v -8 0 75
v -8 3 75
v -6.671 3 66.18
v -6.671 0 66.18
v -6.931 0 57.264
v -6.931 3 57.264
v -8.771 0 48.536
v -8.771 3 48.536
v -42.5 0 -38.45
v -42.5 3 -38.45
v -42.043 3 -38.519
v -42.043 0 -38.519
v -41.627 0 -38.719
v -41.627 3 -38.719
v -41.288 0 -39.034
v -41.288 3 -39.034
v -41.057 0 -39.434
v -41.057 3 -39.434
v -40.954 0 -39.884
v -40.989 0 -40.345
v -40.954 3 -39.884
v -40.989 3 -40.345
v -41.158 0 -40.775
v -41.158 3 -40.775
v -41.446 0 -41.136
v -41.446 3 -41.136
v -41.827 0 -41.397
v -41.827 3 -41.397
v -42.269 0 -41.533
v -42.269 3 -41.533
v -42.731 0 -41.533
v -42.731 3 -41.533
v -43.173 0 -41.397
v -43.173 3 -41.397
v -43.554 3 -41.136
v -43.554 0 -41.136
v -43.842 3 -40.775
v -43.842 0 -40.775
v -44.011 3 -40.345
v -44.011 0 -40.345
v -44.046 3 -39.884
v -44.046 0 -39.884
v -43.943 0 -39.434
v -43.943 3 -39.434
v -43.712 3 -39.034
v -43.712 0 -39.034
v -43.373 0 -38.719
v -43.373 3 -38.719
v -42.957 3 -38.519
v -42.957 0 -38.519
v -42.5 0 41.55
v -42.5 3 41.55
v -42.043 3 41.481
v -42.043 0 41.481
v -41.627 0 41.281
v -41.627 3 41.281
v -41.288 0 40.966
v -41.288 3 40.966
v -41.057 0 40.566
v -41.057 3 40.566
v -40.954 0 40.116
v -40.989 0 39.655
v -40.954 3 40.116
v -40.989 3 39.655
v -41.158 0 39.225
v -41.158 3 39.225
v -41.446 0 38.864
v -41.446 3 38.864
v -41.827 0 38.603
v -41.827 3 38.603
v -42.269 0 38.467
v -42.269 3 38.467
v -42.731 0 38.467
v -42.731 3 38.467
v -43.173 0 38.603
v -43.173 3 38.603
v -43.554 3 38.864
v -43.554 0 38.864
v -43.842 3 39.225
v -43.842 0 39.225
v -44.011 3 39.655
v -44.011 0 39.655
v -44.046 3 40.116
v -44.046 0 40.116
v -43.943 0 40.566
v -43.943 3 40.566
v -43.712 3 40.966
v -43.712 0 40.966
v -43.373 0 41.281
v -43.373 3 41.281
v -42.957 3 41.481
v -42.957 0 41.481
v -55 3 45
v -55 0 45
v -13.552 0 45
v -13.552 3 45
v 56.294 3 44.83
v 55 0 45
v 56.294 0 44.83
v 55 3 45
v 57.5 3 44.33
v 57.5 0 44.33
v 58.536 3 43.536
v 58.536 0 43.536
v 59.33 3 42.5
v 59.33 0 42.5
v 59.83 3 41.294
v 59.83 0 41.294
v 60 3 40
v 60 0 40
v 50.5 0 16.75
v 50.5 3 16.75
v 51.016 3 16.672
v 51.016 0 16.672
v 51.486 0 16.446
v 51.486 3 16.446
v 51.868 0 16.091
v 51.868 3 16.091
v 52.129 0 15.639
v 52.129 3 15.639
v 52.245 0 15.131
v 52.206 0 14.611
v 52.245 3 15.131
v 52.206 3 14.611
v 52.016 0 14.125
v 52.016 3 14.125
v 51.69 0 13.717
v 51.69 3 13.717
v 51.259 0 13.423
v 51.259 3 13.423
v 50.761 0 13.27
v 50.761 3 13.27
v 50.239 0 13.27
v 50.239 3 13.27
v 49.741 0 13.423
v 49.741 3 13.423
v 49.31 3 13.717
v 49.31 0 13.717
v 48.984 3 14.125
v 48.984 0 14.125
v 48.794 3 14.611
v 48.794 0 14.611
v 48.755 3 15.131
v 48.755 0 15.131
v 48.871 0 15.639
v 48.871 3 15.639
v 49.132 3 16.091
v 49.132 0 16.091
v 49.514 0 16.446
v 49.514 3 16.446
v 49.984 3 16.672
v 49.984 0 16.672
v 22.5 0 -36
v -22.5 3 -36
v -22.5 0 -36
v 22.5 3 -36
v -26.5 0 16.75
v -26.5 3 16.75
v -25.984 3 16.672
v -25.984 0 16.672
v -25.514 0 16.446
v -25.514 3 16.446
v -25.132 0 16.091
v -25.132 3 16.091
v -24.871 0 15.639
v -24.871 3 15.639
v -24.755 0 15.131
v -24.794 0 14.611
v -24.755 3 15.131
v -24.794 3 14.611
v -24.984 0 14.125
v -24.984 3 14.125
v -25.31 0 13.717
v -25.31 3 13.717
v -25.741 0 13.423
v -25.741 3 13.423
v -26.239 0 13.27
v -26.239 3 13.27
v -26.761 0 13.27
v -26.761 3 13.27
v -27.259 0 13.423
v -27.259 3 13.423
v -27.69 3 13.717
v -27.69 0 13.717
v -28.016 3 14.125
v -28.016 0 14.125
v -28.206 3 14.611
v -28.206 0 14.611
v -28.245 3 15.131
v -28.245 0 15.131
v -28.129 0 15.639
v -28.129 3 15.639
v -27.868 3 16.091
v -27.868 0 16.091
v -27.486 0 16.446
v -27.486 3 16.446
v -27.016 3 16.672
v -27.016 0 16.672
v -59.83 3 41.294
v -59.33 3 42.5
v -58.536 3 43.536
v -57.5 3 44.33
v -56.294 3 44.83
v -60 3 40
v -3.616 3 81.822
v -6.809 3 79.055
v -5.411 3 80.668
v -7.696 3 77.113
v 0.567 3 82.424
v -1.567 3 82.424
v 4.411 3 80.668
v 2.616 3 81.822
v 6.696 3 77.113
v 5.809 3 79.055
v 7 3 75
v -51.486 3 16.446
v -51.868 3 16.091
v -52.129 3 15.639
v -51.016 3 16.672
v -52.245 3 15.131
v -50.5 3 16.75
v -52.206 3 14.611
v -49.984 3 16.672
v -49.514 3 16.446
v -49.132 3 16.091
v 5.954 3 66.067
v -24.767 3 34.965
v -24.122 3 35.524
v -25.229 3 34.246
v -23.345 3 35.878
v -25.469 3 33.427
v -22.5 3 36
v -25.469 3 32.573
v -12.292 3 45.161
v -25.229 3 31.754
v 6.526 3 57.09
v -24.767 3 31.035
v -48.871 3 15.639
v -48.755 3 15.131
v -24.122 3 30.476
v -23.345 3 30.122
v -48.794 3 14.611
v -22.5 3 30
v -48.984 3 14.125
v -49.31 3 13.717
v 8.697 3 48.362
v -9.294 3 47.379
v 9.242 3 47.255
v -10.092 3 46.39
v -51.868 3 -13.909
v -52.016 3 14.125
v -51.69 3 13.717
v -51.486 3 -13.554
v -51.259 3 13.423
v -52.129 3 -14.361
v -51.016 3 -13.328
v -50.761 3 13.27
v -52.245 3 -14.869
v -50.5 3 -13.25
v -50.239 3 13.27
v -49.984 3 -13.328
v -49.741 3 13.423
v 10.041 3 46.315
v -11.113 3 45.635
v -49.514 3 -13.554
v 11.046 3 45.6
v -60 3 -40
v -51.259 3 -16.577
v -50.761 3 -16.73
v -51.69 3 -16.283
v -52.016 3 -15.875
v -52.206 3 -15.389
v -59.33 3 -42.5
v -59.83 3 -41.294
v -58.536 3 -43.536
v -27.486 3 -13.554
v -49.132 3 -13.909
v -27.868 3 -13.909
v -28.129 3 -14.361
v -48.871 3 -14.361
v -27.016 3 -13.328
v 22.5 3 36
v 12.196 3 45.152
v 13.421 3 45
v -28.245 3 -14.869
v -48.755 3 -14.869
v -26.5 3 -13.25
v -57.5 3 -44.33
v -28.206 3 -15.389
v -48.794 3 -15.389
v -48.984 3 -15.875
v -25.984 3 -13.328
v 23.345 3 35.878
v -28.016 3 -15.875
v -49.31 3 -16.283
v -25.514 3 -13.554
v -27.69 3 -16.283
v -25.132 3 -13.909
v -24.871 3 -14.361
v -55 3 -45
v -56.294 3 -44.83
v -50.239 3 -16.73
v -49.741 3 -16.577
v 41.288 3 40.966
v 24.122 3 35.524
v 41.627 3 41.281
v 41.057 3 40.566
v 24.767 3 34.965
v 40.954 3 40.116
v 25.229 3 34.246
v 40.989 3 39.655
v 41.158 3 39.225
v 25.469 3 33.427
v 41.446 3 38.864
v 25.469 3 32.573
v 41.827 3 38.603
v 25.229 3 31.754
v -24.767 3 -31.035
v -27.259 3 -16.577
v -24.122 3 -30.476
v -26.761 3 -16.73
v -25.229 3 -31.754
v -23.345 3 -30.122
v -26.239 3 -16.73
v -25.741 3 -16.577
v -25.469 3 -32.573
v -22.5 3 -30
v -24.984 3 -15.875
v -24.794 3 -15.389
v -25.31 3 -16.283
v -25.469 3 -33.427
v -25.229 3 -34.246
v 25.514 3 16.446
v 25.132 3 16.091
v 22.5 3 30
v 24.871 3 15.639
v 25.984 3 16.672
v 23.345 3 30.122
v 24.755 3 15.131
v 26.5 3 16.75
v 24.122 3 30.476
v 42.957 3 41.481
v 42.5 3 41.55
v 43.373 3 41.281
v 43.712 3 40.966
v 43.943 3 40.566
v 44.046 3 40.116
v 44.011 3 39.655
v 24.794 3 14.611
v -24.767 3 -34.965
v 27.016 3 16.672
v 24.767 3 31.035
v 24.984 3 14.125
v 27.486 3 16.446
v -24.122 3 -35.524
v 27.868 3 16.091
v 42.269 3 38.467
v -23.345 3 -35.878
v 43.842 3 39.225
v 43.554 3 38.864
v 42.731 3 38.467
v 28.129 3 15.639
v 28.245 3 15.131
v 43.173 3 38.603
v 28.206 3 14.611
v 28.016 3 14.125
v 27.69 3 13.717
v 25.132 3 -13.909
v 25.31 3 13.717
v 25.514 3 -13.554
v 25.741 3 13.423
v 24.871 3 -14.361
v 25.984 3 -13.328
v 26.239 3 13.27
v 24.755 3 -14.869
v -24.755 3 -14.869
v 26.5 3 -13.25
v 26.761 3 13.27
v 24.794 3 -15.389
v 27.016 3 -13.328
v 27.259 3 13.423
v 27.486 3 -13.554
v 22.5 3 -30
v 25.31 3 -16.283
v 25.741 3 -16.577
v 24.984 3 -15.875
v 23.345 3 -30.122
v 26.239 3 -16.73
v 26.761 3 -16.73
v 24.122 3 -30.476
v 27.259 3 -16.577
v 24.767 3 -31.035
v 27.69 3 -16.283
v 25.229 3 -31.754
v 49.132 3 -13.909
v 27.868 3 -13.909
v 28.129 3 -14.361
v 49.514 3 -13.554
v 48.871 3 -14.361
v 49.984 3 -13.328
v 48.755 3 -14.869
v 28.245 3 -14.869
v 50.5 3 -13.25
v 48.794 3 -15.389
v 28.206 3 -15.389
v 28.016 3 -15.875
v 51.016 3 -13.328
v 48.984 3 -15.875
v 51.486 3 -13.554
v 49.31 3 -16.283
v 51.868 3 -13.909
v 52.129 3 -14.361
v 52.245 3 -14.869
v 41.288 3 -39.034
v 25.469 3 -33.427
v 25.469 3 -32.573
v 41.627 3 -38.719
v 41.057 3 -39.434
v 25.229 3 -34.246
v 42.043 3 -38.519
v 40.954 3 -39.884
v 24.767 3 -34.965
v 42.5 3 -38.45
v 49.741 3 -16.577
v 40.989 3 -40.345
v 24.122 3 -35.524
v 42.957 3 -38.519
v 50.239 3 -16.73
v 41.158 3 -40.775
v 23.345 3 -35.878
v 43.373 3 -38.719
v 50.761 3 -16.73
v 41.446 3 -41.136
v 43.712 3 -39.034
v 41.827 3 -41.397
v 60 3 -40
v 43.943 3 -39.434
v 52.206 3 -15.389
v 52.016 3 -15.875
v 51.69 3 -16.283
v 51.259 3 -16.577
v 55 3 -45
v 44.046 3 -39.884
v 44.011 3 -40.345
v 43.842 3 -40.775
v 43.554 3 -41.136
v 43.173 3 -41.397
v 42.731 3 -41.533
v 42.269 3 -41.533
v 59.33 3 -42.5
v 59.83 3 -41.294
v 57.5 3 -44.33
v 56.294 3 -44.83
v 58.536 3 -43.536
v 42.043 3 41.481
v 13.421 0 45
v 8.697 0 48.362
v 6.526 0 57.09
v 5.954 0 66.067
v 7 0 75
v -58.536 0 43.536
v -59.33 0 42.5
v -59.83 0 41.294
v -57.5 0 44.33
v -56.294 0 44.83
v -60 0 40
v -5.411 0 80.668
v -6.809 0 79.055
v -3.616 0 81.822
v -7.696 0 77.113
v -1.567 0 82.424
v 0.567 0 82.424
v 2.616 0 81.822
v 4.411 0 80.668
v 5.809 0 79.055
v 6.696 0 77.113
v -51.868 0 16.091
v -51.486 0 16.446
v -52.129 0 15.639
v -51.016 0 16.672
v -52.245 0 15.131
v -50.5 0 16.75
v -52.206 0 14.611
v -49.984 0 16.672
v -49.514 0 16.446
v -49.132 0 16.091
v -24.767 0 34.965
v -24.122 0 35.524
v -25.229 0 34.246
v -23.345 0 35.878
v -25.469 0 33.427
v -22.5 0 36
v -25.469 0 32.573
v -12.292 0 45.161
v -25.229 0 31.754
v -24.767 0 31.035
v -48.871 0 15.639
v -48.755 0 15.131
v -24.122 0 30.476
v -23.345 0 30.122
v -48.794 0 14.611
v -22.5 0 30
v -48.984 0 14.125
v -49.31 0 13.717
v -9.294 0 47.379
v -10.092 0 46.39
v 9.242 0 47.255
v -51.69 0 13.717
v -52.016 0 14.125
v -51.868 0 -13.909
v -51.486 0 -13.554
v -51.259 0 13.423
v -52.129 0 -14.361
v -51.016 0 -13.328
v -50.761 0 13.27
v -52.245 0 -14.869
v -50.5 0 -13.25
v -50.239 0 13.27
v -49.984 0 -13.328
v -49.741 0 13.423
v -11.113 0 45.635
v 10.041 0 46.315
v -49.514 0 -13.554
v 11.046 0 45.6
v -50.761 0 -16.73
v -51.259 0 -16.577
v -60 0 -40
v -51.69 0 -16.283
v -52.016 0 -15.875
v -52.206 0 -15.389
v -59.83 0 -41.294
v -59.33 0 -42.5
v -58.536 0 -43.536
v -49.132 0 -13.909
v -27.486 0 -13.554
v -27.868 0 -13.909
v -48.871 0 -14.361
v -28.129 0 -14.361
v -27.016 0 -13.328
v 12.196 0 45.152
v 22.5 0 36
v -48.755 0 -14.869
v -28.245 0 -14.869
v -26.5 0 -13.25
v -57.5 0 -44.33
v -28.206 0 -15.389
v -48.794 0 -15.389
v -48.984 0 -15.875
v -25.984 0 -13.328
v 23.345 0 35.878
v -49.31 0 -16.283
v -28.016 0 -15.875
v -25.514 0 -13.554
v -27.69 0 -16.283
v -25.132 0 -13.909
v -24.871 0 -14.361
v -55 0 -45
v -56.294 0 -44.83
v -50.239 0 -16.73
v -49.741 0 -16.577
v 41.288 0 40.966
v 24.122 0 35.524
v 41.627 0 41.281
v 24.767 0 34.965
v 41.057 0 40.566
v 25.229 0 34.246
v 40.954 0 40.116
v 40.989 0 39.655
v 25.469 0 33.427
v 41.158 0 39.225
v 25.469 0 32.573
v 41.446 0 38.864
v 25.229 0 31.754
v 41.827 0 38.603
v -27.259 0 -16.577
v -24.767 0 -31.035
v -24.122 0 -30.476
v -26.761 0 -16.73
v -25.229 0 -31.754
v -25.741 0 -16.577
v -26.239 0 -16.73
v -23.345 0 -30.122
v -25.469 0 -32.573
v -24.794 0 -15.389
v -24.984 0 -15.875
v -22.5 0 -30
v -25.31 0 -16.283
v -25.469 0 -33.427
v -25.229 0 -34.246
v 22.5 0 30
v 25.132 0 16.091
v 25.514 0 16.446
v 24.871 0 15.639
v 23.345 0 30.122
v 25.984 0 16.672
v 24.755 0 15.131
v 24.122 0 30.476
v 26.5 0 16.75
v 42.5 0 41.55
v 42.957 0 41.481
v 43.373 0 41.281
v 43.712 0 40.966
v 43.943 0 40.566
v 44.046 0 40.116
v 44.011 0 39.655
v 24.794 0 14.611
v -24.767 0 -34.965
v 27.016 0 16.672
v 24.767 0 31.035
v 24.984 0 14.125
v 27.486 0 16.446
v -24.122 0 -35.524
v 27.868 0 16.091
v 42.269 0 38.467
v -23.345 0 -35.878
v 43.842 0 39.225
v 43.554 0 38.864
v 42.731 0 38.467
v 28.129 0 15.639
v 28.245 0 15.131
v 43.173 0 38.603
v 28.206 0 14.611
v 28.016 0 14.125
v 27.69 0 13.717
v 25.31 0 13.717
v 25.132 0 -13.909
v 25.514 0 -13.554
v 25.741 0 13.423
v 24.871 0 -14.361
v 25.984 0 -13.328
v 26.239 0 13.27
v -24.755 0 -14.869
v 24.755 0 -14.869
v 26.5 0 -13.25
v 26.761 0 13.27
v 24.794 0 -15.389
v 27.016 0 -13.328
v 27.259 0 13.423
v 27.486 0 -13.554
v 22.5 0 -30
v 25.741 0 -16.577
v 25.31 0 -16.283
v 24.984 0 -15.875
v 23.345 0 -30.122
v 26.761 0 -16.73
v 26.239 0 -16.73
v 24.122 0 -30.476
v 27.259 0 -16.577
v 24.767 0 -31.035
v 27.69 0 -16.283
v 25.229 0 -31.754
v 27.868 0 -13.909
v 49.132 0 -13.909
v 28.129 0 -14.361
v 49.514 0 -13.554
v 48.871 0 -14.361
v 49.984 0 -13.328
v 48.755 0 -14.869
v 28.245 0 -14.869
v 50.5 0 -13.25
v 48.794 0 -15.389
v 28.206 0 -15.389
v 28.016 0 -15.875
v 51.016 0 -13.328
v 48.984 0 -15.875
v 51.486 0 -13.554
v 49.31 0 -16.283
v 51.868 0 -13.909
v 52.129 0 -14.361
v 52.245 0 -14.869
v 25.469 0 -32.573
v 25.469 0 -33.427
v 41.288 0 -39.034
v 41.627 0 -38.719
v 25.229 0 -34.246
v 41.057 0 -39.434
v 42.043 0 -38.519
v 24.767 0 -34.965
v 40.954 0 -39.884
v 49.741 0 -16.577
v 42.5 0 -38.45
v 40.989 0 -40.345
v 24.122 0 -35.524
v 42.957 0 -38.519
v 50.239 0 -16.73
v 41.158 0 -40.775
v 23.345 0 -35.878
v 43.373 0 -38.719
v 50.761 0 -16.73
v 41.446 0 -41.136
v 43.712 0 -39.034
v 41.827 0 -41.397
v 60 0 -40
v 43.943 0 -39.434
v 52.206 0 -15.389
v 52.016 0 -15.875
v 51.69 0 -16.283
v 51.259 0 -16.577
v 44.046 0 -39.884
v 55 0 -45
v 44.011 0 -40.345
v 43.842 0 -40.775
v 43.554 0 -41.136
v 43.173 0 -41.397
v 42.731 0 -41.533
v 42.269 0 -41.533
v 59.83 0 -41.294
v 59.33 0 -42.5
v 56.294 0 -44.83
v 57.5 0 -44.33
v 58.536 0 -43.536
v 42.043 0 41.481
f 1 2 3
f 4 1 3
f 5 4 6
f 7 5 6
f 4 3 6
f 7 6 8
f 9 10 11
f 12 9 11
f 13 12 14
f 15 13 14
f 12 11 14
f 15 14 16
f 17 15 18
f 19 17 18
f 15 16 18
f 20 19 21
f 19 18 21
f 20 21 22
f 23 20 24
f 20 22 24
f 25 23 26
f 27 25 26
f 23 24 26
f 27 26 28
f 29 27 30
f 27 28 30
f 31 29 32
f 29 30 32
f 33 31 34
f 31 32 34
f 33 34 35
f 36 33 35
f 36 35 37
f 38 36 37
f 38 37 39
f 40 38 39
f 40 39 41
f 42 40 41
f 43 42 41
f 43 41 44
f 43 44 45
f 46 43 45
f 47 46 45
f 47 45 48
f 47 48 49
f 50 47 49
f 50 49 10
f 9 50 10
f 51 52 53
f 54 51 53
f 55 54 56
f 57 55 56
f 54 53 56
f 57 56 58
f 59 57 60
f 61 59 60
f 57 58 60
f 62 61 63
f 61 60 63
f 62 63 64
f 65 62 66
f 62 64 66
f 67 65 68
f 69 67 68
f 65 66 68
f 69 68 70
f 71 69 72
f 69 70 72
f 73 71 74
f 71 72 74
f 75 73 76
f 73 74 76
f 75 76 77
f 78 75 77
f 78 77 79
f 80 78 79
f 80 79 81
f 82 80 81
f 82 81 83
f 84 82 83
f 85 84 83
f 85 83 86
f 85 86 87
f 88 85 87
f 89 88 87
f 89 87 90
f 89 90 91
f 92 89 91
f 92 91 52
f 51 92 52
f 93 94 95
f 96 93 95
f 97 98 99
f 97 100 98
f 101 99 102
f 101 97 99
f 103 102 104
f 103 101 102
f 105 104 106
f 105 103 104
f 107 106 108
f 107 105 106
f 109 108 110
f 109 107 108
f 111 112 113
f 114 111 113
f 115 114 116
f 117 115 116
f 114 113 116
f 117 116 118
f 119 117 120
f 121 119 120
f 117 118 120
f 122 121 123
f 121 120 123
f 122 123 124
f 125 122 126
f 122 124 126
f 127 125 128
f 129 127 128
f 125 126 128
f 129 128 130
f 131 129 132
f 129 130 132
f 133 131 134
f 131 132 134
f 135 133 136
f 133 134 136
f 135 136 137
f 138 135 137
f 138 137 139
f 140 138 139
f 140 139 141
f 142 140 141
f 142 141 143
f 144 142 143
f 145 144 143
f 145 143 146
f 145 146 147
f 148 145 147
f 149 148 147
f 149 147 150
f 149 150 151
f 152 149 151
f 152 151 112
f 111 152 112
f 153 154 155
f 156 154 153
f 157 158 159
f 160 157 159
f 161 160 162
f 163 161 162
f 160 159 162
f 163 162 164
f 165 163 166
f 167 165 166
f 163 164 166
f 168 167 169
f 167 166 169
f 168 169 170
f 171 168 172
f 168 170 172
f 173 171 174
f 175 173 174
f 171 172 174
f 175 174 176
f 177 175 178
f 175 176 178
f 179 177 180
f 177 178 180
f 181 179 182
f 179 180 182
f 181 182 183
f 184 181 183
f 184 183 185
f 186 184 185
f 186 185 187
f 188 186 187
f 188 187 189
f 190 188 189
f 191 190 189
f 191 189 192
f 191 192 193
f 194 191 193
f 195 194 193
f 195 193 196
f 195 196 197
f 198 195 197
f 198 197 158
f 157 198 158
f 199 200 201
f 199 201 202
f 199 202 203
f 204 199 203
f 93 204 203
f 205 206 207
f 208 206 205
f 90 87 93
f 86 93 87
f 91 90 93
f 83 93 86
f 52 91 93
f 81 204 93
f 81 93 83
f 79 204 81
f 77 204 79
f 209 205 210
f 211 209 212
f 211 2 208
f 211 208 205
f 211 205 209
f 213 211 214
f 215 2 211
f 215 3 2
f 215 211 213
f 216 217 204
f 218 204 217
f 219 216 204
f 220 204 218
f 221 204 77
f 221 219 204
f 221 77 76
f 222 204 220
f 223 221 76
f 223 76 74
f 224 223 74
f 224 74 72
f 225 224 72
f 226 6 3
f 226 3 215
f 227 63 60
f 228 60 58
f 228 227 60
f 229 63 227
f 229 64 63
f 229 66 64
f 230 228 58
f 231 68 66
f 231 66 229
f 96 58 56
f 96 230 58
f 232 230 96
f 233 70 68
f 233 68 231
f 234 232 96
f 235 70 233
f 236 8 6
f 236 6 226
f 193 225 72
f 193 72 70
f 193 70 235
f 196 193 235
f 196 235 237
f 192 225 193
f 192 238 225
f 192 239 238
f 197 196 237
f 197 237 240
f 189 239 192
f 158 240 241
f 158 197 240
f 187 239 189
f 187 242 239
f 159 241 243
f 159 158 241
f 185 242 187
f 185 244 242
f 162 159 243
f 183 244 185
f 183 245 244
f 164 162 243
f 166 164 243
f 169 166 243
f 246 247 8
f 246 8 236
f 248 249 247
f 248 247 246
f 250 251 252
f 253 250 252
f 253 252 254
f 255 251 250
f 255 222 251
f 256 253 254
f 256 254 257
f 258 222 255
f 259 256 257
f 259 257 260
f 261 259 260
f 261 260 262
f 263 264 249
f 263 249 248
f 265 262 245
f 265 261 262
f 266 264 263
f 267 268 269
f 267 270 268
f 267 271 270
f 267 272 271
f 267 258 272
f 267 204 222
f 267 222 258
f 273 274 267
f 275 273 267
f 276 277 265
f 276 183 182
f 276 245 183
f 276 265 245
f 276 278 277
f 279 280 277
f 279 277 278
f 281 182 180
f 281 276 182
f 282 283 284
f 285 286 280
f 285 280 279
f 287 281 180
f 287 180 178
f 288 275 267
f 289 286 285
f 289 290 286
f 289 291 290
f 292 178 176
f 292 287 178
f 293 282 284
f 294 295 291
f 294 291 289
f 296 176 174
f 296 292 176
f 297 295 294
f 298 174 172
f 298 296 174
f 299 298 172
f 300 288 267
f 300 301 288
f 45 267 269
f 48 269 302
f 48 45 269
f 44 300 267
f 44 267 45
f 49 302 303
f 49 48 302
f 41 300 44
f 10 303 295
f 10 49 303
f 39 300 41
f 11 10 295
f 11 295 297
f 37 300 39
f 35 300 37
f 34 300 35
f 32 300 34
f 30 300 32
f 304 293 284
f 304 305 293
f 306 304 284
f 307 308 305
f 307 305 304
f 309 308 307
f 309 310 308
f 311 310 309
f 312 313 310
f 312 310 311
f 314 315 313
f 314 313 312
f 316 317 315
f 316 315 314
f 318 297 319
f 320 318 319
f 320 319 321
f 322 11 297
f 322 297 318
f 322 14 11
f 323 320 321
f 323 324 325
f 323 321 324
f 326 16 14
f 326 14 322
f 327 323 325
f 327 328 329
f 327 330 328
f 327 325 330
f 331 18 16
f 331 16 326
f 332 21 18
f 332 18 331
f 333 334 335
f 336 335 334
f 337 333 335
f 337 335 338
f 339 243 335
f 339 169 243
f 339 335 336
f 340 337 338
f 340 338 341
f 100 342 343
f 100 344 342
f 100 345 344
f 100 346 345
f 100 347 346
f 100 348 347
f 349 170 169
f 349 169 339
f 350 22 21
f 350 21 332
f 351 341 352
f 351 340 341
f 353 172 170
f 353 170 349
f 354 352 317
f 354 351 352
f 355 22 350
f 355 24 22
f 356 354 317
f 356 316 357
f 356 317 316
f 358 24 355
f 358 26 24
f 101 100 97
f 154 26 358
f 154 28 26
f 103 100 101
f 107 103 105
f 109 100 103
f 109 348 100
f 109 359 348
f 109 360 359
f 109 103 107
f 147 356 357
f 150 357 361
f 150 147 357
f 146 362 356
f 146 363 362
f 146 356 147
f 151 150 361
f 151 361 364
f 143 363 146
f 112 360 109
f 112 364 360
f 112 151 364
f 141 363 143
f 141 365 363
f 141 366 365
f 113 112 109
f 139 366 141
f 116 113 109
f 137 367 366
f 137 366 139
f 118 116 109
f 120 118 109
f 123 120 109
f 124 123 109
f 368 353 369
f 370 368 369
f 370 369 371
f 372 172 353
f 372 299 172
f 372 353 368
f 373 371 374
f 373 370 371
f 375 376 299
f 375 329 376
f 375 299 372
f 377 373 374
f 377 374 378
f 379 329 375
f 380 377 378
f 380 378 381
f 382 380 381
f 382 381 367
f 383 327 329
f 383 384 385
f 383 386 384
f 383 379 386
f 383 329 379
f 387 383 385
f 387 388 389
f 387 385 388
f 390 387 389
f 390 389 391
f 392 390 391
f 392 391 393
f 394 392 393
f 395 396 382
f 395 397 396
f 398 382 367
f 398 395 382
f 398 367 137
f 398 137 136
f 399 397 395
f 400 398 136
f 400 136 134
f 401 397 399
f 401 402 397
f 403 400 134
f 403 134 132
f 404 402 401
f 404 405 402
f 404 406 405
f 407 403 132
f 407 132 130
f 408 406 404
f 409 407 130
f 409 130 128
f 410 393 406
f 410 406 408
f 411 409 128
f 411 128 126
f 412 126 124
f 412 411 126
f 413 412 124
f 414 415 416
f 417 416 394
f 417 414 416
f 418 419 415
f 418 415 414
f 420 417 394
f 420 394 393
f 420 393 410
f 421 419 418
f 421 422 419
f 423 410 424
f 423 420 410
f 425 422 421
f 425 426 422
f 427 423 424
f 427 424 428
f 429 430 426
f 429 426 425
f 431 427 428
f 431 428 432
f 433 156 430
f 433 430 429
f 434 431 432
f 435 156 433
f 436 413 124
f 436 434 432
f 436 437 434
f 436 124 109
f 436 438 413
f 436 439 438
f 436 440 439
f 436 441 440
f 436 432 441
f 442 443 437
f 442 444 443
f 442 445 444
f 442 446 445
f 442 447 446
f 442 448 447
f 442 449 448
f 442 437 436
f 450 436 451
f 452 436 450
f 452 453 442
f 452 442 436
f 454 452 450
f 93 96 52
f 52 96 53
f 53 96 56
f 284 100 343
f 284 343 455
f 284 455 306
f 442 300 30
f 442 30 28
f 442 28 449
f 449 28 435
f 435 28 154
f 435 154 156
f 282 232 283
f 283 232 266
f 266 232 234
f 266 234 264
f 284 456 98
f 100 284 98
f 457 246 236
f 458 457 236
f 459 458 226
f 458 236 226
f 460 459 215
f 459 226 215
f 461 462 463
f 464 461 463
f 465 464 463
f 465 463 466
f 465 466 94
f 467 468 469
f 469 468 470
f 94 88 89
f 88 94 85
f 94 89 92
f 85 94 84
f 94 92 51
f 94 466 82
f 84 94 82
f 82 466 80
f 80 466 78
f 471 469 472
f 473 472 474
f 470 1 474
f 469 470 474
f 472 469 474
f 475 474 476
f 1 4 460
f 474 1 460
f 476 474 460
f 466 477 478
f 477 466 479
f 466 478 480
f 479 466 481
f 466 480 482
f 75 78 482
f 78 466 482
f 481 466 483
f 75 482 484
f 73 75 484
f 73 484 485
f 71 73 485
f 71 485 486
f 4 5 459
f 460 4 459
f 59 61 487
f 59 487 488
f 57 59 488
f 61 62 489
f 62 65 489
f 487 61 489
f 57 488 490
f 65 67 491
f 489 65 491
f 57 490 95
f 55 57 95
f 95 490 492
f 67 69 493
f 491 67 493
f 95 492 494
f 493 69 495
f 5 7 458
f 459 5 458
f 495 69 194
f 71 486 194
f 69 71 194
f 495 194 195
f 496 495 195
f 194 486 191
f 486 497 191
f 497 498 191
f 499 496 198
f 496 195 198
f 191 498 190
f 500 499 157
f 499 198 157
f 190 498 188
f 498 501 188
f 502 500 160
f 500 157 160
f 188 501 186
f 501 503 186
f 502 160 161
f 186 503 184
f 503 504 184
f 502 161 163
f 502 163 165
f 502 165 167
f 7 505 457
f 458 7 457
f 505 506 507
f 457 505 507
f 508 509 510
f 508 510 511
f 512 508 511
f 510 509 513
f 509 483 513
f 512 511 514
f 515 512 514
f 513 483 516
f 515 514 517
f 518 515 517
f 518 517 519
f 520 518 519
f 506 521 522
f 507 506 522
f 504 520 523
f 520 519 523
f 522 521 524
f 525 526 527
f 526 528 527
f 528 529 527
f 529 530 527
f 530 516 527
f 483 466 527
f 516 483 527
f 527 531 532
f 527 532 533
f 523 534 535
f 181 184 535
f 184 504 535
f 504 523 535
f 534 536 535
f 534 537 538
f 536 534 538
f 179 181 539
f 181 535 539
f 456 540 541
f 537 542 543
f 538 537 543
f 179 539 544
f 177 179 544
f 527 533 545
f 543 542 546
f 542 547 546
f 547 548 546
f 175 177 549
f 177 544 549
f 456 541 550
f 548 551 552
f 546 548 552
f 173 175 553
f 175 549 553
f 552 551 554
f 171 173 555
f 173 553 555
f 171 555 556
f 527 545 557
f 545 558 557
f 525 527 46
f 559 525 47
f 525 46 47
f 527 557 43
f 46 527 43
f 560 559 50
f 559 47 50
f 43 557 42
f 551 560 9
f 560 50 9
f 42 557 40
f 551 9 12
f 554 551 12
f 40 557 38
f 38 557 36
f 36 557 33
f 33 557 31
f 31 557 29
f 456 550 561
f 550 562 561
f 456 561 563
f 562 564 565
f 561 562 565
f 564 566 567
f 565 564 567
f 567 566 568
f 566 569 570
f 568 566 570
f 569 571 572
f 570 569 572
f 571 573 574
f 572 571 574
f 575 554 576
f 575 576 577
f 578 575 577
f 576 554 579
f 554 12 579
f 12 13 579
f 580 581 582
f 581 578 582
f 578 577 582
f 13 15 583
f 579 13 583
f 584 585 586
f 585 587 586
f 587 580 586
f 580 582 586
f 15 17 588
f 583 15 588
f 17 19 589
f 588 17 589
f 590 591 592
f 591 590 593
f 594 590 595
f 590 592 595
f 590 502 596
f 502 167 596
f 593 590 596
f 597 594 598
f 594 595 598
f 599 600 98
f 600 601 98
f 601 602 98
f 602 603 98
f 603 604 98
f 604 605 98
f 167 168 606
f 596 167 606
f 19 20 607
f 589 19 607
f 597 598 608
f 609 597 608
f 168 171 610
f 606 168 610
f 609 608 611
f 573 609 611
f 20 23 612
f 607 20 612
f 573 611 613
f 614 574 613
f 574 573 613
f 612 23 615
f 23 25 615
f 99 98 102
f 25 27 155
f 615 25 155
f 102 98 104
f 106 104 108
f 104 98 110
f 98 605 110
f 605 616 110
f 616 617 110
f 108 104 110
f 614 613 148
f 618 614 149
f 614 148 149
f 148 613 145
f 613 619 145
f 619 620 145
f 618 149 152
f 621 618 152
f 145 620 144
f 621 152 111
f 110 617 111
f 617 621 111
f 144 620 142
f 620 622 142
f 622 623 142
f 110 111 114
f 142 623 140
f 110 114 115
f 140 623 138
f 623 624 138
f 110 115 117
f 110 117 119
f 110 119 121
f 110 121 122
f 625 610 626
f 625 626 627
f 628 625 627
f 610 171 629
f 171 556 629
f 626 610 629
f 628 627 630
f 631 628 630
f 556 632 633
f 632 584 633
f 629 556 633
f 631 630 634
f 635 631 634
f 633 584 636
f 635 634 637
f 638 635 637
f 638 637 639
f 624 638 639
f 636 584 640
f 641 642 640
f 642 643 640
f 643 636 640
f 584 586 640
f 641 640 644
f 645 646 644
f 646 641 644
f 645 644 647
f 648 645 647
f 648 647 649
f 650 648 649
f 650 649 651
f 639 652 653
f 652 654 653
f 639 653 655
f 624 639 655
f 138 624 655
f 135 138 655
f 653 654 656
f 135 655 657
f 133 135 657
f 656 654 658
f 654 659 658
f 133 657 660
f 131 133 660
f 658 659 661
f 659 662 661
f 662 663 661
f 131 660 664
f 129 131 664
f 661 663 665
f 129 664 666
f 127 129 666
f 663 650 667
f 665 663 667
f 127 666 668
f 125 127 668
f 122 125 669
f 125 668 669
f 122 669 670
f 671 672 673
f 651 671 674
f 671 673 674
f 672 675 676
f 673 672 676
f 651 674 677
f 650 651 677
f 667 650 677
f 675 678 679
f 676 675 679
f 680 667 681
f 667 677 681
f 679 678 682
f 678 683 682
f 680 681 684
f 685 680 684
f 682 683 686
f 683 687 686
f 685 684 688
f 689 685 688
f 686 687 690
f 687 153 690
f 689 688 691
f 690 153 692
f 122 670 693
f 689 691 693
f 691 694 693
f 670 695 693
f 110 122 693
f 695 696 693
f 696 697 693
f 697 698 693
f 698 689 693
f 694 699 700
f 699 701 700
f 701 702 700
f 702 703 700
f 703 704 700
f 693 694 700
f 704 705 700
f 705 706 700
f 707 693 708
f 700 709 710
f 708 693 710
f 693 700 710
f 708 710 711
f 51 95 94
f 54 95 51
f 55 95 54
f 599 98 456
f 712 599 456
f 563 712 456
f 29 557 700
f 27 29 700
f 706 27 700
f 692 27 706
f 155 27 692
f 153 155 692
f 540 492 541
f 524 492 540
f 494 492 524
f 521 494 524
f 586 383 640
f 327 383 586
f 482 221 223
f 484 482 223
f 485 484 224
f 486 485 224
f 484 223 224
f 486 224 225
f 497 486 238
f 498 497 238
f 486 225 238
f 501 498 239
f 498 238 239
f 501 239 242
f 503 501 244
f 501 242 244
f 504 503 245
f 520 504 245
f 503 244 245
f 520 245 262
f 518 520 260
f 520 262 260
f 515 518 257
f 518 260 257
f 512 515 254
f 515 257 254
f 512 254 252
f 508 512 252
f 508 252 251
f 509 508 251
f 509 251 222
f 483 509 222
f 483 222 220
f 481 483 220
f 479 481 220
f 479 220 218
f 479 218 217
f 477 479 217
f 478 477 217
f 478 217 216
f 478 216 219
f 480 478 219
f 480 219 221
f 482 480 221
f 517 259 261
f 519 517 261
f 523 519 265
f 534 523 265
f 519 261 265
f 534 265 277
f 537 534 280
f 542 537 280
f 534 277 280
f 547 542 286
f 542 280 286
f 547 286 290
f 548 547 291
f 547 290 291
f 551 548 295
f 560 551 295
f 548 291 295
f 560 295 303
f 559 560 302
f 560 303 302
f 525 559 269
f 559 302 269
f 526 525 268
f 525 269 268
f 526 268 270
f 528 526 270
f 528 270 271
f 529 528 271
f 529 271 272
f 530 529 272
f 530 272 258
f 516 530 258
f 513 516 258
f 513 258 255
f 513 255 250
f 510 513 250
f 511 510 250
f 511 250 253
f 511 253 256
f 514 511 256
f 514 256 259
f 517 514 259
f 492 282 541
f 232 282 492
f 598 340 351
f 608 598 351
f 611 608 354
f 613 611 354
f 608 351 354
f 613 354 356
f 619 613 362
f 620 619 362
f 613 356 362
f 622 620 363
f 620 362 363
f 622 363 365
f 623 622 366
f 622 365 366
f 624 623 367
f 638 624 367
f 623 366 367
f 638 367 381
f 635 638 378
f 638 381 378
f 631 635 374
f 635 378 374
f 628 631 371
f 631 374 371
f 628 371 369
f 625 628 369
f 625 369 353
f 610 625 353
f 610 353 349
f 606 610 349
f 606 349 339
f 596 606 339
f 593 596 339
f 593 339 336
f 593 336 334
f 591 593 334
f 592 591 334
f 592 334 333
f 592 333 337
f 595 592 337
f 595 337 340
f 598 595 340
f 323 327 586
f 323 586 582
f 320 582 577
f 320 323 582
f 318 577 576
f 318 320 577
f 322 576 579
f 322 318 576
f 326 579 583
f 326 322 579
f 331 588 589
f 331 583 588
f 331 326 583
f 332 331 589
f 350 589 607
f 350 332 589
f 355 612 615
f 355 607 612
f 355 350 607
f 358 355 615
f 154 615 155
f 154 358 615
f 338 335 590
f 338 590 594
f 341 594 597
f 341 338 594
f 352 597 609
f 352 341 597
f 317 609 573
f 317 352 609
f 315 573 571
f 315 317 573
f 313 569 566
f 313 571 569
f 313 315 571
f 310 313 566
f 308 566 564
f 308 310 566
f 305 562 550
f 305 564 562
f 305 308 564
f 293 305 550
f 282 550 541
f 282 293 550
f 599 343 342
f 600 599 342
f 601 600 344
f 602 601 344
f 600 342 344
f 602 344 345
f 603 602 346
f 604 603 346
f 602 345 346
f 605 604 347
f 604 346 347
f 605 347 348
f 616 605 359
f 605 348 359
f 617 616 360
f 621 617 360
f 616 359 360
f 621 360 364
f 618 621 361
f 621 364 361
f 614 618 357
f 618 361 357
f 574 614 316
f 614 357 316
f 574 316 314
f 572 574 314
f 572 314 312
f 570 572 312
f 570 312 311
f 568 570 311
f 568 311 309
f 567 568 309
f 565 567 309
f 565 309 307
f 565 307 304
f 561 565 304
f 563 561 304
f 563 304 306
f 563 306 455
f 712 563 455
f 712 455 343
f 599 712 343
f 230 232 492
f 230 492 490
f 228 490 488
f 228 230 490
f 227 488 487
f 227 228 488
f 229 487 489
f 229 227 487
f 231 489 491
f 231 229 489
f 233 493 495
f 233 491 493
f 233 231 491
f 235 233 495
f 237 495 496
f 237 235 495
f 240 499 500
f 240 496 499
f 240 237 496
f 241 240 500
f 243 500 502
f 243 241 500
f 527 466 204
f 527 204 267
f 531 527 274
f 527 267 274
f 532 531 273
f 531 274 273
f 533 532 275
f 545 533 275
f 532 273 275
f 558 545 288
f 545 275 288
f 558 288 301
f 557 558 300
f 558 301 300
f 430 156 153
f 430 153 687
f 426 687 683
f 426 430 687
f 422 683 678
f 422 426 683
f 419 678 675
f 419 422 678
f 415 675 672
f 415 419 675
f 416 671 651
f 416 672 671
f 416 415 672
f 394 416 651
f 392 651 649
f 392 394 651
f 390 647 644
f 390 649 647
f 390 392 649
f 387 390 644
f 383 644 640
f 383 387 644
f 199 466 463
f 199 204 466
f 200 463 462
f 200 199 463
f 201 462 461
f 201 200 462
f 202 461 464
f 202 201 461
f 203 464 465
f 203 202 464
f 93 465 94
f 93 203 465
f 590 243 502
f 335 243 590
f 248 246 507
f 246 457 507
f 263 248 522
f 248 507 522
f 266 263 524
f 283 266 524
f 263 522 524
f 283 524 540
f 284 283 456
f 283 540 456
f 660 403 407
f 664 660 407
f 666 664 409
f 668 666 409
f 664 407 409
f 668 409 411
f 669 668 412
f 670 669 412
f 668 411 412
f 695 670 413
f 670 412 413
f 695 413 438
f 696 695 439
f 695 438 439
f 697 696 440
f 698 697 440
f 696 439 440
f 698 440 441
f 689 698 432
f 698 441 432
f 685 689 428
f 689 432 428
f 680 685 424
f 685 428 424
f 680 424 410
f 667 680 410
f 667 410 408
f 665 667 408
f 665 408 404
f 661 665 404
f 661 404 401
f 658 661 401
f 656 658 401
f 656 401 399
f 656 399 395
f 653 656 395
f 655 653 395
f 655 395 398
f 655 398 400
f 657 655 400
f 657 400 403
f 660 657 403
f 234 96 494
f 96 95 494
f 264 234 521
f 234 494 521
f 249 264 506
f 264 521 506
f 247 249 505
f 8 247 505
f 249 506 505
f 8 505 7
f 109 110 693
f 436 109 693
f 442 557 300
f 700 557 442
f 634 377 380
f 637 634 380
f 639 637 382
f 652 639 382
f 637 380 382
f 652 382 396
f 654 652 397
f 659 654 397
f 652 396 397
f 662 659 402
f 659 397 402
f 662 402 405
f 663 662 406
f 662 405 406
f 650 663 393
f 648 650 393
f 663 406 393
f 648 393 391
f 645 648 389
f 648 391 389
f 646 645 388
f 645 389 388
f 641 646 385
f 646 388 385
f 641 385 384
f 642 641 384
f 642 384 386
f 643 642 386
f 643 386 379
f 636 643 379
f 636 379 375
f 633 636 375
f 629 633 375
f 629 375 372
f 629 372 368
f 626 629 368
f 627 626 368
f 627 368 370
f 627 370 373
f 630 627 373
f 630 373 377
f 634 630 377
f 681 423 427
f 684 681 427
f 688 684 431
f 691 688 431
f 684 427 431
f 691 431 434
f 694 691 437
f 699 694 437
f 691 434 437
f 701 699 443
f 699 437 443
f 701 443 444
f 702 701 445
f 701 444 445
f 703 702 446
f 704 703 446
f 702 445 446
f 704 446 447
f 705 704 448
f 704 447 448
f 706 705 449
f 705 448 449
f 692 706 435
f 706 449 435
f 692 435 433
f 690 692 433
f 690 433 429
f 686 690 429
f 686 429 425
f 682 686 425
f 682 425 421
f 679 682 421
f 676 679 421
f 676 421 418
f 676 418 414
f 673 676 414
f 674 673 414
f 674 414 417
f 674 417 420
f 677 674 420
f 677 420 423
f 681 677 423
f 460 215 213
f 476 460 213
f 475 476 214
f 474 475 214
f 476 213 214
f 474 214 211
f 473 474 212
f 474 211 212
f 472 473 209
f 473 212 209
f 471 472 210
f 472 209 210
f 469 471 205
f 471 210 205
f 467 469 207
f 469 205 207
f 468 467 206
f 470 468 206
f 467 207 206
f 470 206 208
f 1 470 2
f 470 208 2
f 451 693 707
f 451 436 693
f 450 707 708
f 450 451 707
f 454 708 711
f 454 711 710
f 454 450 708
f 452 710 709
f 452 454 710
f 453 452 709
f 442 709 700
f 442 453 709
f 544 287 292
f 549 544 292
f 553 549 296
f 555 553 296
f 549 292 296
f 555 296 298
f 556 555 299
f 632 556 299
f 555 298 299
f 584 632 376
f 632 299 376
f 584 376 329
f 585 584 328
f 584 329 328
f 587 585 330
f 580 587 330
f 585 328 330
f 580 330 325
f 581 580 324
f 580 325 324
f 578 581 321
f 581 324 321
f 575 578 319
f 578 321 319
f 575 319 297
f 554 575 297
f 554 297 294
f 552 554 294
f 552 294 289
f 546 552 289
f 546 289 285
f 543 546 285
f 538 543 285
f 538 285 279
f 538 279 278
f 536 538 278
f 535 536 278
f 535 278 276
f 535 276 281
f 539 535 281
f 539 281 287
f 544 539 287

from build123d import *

# Parameters (mm, degrees)
SKETCH1_W           = 120
SKETCH1_H           = 90
BOSS_EXTRUDE1_DEPTH = 3
FILLET_1_R          = 5
CUT_EXTRUDE_1_DEPTH = 76.059976019
EXTRUDE_1_DEPTH     = 3
SKETCH_3_R          = 1.55
SKETCH_3_R_2        = 1.75
CUT_EXTRUDE_2_DEPTH = 103.055132159
FILLET_2_R          = 5


with BuildPart() as part:
    # Sketch1 → Boss-Extrude1 (new body)
    with BuildSketch(Plane(origin=(0, 0, 0), x_dir=(1, 0, 0), z_dir=(0, 1, 0))):
        Rectangle(SKETCH1_W, SKETCH1_H)
    extrude(amount=BOSS_EXTRUDE1_DEPTH)

    # 圆角1
    fillet_1_edges = [part.edges().sort_by_distance(p)[0] for p in [
        (60, 1.5, 45),
        (-60, 1.5, 45),
        (-60, 1.5, -45),
        (60, 1.5, -45),
    ]]
    fillet(fillet_1_edges, radius=FILLET_1_R)

    # 草图1 → 切除-拉伸1 (cut, through all)
    with BuildSketch(Plane(origin=(0, 3, 0), x_dir=(1, 0, 0), z_dir=(0, 1, 0))):
        with BuildLine():
            Line((-22.5, 36), (22.5, 36))
            ThreePointArc((22.5, 36), (25.5, 33), (22.5, 30))
            Line((22.5, 30), (-22.5, 30))
            ThreePointArc((-22.5, 30), (-25.5, 33), (-22.5, 36))
        make_face()
        with BuildLine():
            Line((-22.5, -30), (22.5, -30))
            ThreePointArc((22.5, -30), (25.5, -33), (22.5, -36))
            Line((22.5, -36), (-22.5, -36))
            ThreePointArc((-22.5, -36), (-25.5, -33), (-22.5, -30))
        make_face()
    extrude(amount=-CUT_EXTRUDE_1_DEPTH, mode=Mode.SUBTRACT)

    # 草图2 → 凸台-拉伸1 (add)
    with BuildSketch(Plane(origin=(0, 3, 0), x_dir=(1, 0, 0), z_dir=(0, 1, 0))):
        with BuildLine():
            Line((-10, -45), (10, -45))
            ThreePointArc((10, -45), (6.18491446, -59.768491446), (7, -75))
            ThreePointArc((7, -75), (-0.5, -82.5), (-8, -75))
            ThreePointArc((-8, -75), (-6.691600161, -59.846106677), (-10, -45))
        make_face()
    extrude(amount=-EXTRUDE_1_DEPTH)

    # 草图3 → 切除-拉伸2 (cut, through all)
    with BuildSketch(Plane(origin=(0, 3, 0), x_dir=(1, 0, 0), z_dir=(0, 1, 0))):
        with Locations(Location((42.5, -40, 0), (0, 0, 270))):
            Circle(SKETCH_3_R)
        with Locations(Location((42.5, 40, 0), (0, 0, 270))):
            Circle(SKETCH_3_R)
        with Locations(Location((-42.5, -40, 0), (0, 0, 270))):
            Circle(SKETCH_3_R)
        with Locations(Location((-42.5, 40, 0), (0, 0, 270))):
            Circle(SKETCH_3_R)
        with Locations(Location((-50.5, -15, 0), (0, 0, 270))):
            Circle(SKETCH_3_R_2)
        with Locations(Location((-26.5, -15, 0), (0, 0, 270))):
            Circle(SKETCH_3_R_2)
        with Locations(Location((-26.5, 15, 0), (0, 0, 270))):
            Circle(SKETCH_3_R_2)
        with Locations(Location((-50.5, 15, 0), (0, 0, 270))):
            Circle(SKETCH_3_R_2)
        with Locations(Location((50.5, -15, 0), (0, 0, 270))):
            Circle(SKETCH_3_R_2)
        with Locations(Location((50.5, 15, 0), (0, 0, 270))):
            Circle(SKETCH_3_R_2)
        with Locations(Location((26.5, -15, 0), (0, 0, 270))):
            Circle(SKETCH_3_R_2)
        with Locations(Location((26.5, 15, 0), (0, 0, 270))):
            Circle(SKETCH_3_R_2)
    extrude(amount=-CUT_EXTRUDE_2_DEPTH, mode=Mode.SUBTRACT)

    # 圆角2
    fillet_2_edges = [part.edges().sort_by_distance(p)[0] for p in [
        (10, 1.5, 45),
        (-10, 1.5, 45),
    ]]
    fillet(fillet_2_edges, radius=FILLET_2_R)


solid = part.part
